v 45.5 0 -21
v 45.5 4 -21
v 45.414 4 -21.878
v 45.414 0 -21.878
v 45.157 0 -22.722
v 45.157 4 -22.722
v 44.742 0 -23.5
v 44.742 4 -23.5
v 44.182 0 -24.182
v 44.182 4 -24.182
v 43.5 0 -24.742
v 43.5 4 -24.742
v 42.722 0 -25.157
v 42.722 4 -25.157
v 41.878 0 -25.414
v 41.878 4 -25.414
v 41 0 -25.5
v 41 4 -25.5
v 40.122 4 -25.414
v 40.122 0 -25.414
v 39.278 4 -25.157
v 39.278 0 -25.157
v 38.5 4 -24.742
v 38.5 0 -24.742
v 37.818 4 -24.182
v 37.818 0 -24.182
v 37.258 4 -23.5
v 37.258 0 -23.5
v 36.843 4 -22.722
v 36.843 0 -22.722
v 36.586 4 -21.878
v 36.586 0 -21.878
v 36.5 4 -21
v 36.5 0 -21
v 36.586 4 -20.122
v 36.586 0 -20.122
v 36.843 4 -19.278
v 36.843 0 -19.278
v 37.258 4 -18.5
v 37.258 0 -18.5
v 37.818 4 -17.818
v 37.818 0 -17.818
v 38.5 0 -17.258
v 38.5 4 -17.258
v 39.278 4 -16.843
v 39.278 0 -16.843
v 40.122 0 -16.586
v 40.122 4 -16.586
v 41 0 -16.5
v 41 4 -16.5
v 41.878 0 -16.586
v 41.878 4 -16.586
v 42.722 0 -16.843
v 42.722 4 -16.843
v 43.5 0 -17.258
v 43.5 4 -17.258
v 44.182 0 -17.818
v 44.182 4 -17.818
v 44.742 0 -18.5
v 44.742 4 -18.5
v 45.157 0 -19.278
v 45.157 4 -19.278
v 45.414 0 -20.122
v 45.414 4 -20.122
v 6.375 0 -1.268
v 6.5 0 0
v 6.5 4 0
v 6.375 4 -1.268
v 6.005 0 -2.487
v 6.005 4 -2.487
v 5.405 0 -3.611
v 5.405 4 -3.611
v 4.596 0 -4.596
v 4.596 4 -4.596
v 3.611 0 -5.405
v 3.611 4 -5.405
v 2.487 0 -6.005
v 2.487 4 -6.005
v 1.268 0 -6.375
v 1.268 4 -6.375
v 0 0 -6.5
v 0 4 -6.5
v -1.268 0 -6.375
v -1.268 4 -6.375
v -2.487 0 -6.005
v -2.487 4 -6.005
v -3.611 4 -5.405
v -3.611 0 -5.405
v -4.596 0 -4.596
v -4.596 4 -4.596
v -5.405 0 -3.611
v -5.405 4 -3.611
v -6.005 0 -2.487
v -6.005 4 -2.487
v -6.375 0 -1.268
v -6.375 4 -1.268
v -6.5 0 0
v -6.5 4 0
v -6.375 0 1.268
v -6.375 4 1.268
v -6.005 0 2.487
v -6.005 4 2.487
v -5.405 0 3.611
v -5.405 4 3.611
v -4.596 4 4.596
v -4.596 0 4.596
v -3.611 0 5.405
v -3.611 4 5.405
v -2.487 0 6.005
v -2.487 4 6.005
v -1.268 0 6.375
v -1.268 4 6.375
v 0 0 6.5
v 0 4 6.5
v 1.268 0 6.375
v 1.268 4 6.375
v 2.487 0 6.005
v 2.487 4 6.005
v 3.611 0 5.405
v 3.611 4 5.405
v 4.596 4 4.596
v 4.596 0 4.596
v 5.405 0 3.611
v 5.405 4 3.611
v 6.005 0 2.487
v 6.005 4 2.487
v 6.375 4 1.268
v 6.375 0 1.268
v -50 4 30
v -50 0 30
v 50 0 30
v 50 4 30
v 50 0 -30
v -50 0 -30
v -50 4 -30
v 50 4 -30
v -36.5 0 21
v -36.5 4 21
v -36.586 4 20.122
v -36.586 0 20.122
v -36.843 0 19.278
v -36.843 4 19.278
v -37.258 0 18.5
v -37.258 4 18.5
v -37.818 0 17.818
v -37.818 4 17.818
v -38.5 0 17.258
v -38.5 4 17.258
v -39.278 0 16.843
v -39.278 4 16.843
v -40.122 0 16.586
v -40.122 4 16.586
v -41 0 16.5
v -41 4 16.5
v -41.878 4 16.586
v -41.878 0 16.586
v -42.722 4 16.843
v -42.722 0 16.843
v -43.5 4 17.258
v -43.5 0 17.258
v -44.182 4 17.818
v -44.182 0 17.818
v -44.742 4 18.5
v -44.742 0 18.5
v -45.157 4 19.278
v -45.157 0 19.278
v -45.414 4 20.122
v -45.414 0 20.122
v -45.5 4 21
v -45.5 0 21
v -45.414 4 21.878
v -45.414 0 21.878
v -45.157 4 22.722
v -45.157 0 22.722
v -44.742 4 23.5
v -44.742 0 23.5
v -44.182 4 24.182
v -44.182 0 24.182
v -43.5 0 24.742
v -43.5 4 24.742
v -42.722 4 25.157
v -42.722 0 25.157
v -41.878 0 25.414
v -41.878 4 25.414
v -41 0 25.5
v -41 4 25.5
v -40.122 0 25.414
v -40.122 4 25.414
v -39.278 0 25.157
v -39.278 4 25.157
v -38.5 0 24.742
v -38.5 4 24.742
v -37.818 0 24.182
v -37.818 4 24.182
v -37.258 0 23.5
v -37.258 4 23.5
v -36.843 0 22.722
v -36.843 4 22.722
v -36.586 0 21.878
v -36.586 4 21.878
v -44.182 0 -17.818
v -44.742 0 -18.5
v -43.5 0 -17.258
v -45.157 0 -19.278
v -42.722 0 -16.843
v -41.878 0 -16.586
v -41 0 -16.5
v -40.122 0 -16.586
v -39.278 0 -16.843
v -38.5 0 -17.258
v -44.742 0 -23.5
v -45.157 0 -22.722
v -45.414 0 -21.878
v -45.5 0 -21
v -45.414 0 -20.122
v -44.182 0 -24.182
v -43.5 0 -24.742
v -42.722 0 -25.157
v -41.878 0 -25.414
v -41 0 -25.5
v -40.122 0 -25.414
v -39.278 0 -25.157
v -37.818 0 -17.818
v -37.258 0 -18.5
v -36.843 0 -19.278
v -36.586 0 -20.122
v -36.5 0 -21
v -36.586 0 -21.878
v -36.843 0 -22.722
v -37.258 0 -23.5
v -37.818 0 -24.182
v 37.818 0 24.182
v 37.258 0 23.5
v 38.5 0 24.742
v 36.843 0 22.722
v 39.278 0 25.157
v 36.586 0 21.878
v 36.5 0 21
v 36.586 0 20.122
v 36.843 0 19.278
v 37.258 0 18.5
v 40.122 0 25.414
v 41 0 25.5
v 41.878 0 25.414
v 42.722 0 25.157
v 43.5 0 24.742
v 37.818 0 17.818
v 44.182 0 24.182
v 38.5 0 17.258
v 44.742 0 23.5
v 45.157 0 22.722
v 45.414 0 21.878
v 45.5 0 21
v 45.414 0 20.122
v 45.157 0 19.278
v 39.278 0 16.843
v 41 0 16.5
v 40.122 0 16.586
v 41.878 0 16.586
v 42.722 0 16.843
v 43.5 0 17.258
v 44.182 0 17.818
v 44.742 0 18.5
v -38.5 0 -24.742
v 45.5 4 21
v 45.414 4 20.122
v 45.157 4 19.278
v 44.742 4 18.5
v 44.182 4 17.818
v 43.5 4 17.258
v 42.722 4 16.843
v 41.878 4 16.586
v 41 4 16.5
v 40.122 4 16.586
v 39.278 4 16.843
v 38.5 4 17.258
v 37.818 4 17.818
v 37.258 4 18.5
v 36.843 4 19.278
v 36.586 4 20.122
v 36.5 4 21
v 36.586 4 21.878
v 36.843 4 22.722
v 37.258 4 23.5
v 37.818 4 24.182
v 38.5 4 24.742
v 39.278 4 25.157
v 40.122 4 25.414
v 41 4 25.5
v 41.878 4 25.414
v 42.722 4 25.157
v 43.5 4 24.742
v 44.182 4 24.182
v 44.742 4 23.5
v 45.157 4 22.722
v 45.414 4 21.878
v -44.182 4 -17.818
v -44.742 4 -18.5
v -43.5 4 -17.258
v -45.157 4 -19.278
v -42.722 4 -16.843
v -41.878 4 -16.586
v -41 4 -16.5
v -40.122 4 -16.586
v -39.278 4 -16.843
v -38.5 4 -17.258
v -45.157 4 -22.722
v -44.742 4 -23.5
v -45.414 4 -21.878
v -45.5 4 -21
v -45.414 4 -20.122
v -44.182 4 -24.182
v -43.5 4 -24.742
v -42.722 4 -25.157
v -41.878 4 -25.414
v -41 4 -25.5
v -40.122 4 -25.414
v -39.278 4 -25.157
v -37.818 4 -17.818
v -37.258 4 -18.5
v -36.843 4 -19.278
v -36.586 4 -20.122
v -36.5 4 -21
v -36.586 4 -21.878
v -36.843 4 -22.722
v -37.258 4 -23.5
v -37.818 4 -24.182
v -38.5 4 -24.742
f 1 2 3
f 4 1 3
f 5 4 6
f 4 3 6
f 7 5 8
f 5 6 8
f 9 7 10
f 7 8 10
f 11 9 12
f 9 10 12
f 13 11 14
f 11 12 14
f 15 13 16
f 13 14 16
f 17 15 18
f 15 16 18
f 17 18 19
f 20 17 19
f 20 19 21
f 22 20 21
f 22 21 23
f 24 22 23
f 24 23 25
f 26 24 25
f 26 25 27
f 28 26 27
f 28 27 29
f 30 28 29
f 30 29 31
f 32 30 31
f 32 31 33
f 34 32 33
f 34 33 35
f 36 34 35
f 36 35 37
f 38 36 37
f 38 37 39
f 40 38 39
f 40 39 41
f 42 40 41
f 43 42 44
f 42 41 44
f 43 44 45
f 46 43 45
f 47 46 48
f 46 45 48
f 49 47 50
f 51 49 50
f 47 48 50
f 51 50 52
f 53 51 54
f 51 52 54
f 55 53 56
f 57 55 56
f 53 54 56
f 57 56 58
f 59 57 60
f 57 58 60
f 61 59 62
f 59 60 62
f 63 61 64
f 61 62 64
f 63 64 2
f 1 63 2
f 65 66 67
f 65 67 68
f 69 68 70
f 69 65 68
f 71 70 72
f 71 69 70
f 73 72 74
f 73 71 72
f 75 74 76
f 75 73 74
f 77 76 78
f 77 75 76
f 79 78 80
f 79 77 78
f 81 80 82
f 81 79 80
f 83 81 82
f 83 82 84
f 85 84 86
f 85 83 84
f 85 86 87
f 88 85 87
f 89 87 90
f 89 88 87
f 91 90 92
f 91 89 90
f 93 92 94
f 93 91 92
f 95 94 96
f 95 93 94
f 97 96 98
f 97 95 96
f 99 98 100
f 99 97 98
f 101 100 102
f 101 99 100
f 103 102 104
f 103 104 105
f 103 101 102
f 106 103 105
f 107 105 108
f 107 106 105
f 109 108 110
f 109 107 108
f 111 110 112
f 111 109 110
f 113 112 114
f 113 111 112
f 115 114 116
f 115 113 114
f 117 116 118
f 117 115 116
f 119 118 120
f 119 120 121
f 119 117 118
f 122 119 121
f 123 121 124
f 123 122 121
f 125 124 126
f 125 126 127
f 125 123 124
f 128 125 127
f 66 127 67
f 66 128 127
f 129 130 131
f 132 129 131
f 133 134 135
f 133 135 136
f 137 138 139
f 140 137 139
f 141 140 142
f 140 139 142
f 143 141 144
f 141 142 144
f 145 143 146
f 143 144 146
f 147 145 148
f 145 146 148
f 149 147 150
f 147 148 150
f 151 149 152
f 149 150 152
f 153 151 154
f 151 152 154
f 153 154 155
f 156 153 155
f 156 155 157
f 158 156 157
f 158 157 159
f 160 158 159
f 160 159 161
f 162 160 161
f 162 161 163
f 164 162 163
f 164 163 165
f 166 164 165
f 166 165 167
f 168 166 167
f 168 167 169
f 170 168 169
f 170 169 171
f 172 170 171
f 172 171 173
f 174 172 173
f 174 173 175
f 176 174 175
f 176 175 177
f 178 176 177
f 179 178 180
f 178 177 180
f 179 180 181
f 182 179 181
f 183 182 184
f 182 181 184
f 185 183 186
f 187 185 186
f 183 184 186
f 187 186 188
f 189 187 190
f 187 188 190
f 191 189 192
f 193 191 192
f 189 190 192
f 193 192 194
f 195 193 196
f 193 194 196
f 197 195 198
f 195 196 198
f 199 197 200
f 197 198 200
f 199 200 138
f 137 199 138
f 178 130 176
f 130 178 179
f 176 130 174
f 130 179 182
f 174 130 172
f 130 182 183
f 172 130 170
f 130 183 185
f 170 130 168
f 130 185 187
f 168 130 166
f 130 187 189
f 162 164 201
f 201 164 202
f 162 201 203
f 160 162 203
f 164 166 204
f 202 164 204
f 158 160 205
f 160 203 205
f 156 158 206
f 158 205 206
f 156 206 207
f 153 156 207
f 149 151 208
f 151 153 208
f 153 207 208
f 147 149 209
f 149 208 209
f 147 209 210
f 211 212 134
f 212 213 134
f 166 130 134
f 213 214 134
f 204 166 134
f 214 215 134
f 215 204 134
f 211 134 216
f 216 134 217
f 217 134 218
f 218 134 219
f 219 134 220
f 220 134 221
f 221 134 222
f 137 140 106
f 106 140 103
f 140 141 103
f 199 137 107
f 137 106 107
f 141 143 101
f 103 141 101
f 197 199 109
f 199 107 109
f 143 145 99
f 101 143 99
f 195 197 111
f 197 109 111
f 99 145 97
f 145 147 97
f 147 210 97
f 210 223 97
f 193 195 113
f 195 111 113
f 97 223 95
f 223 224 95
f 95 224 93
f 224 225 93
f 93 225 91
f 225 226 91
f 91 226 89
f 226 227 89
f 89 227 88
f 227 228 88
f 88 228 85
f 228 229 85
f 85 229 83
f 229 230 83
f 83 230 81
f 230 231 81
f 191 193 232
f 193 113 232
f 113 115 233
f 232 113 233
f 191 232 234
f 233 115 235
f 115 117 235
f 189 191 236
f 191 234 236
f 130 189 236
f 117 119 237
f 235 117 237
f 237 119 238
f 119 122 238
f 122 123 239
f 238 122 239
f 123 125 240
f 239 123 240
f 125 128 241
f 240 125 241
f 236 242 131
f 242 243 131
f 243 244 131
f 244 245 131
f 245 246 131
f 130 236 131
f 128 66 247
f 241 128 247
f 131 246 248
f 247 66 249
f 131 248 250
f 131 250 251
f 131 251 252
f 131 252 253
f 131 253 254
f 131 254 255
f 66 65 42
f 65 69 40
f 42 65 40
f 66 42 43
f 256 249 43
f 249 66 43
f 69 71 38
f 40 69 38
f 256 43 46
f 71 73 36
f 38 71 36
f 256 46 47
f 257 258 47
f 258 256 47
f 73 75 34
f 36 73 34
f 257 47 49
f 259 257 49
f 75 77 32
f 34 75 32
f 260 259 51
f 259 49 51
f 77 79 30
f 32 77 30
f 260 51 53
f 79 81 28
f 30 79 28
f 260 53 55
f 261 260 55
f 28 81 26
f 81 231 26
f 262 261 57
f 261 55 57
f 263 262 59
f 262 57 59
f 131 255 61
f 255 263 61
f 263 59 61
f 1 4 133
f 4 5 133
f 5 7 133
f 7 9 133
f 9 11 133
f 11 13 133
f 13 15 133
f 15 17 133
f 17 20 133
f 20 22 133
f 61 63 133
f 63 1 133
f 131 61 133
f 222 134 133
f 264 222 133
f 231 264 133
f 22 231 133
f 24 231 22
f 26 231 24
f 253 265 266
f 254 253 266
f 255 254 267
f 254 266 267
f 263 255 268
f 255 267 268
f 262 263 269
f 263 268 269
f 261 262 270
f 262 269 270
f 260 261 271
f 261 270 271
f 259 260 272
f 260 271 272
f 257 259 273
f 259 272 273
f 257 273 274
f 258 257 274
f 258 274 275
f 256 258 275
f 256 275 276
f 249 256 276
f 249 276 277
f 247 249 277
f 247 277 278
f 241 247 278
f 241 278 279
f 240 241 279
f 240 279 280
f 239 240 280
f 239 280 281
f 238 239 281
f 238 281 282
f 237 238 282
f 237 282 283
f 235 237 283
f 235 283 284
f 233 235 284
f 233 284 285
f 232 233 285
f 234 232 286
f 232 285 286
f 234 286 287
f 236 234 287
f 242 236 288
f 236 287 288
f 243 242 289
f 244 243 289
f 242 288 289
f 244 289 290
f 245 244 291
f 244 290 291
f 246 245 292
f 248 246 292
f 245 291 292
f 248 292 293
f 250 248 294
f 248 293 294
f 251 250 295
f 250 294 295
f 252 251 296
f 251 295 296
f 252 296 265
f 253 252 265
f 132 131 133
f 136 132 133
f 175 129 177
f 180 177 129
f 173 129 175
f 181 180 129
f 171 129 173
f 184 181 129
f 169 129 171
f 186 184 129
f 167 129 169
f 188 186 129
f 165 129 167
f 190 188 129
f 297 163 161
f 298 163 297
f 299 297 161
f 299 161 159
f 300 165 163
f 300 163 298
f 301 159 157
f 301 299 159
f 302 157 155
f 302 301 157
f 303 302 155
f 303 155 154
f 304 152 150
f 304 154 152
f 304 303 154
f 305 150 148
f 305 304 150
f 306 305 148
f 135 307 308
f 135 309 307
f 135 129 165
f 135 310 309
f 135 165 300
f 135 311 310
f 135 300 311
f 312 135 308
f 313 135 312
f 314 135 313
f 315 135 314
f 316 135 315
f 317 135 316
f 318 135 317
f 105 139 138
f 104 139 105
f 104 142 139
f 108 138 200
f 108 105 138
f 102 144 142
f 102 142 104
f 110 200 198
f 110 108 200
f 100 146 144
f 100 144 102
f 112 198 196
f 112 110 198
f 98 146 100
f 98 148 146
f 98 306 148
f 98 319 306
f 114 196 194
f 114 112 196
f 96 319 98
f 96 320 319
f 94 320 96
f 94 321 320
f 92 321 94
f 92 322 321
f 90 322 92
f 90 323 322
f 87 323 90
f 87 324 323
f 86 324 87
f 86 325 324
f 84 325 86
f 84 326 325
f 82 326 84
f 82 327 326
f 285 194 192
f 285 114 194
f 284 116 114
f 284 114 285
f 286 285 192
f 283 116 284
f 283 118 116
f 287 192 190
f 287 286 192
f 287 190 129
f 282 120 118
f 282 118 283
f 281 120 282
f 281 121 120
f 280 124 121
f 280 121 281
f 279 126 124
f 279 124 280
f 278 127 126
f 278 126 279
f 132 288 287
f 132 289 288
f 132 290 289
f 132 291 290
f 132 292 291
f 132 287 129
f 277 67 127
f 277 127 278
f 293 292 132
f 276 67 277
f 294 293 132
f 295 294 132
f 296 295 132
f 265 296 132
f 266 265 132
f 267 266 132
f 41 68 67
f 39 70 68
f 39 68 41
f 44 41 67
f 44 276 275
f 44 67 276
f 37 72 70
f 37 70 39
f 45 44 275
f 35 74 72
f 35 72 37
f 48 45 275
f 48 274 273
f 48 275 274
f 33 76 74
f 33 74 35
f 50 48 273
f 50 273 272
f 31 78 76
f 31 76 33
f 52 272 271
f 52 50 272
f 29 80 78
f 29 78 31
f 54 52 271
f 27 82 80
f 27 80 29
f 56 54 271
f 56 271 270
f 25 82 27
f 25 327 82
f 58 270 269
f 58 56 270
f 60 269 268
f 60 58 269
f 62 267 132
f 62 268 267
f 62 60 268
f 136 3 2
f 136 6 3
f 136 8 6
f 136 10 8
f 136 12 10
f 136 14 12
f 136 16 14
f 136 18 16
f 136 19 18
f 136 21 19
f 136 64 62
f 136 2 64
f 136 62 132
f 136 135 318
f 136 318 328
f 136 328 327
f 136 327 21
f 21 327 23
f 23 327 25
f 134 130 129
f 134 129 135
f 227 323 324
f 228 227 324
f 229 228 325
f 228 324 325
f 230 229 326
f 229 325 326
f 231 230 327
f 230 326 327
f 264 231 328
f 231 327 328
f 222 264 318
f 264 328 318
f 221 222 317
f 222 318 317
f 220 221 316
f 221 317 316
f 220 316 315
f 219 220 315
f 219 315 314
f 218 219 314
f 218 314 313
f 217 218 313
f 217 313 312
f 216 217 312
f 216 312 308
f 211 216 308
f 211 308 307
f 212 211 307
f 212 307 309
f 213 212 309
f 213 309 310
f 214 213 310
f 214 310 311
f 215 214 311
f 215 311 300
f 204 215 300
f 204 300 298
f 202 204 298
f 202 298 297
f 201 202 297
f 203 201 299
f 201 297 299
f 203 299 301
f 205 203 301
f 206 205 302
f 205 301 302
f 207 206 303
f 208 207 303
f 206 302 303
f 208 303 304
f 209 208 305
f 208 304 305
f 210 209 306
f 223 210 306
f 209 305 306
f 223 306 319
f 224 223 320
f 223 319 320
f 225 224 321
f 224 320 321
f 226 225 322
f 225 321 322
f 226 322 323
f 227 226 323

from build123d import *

# Parameters (mm, degrees)
SKETCH1_W           = 100
SKETCH1_H           = 60
SKETCH1_R           = 6.5
BOSS_EXTRUDE1_DEPTH = 4
SKETCH2_R           = 4.5
CUT_EXTRUDE1_DEPTH  = 5


with BuildPart() as part:
    # Sketch1 → Boss-Extrude1 (new body)
    with BuildSketch(Plane(origin=(0, 0, 0), x_dir=(1, 0, 0), z_dir=(0, 1, 0))):
        Rectangle(SKETCH1_W, SKETCH1_H)
        Circle(SKETCH1_R, mode=Mode.SUBTRACT)
    extrude(amount=BOSS_EXTRUDE1_DEPTH)

    # Sketch2 → Cut-Extrude1 (cut, through all)
    with BuildSketch(Plane(origin=(0, 4, 0), x_dir=(1, 0, 0), z_dir=(0, 1, 0))):
        with Locations((-41, 21)):
            Circle(SKETCH2_R)
        with Locations((41, 21)):
            Circle(SKETCH2_R)
        with Locations((41, -21)):
            Circle(SKETCH2_R)
        with Locations((-41, -21)):
            Circle(SKETCH2_R)
    extrude(amount=-CUT_EXTRUDE1_DEPTH, mode=Mode.SUBTRACT)


solid = part.part
